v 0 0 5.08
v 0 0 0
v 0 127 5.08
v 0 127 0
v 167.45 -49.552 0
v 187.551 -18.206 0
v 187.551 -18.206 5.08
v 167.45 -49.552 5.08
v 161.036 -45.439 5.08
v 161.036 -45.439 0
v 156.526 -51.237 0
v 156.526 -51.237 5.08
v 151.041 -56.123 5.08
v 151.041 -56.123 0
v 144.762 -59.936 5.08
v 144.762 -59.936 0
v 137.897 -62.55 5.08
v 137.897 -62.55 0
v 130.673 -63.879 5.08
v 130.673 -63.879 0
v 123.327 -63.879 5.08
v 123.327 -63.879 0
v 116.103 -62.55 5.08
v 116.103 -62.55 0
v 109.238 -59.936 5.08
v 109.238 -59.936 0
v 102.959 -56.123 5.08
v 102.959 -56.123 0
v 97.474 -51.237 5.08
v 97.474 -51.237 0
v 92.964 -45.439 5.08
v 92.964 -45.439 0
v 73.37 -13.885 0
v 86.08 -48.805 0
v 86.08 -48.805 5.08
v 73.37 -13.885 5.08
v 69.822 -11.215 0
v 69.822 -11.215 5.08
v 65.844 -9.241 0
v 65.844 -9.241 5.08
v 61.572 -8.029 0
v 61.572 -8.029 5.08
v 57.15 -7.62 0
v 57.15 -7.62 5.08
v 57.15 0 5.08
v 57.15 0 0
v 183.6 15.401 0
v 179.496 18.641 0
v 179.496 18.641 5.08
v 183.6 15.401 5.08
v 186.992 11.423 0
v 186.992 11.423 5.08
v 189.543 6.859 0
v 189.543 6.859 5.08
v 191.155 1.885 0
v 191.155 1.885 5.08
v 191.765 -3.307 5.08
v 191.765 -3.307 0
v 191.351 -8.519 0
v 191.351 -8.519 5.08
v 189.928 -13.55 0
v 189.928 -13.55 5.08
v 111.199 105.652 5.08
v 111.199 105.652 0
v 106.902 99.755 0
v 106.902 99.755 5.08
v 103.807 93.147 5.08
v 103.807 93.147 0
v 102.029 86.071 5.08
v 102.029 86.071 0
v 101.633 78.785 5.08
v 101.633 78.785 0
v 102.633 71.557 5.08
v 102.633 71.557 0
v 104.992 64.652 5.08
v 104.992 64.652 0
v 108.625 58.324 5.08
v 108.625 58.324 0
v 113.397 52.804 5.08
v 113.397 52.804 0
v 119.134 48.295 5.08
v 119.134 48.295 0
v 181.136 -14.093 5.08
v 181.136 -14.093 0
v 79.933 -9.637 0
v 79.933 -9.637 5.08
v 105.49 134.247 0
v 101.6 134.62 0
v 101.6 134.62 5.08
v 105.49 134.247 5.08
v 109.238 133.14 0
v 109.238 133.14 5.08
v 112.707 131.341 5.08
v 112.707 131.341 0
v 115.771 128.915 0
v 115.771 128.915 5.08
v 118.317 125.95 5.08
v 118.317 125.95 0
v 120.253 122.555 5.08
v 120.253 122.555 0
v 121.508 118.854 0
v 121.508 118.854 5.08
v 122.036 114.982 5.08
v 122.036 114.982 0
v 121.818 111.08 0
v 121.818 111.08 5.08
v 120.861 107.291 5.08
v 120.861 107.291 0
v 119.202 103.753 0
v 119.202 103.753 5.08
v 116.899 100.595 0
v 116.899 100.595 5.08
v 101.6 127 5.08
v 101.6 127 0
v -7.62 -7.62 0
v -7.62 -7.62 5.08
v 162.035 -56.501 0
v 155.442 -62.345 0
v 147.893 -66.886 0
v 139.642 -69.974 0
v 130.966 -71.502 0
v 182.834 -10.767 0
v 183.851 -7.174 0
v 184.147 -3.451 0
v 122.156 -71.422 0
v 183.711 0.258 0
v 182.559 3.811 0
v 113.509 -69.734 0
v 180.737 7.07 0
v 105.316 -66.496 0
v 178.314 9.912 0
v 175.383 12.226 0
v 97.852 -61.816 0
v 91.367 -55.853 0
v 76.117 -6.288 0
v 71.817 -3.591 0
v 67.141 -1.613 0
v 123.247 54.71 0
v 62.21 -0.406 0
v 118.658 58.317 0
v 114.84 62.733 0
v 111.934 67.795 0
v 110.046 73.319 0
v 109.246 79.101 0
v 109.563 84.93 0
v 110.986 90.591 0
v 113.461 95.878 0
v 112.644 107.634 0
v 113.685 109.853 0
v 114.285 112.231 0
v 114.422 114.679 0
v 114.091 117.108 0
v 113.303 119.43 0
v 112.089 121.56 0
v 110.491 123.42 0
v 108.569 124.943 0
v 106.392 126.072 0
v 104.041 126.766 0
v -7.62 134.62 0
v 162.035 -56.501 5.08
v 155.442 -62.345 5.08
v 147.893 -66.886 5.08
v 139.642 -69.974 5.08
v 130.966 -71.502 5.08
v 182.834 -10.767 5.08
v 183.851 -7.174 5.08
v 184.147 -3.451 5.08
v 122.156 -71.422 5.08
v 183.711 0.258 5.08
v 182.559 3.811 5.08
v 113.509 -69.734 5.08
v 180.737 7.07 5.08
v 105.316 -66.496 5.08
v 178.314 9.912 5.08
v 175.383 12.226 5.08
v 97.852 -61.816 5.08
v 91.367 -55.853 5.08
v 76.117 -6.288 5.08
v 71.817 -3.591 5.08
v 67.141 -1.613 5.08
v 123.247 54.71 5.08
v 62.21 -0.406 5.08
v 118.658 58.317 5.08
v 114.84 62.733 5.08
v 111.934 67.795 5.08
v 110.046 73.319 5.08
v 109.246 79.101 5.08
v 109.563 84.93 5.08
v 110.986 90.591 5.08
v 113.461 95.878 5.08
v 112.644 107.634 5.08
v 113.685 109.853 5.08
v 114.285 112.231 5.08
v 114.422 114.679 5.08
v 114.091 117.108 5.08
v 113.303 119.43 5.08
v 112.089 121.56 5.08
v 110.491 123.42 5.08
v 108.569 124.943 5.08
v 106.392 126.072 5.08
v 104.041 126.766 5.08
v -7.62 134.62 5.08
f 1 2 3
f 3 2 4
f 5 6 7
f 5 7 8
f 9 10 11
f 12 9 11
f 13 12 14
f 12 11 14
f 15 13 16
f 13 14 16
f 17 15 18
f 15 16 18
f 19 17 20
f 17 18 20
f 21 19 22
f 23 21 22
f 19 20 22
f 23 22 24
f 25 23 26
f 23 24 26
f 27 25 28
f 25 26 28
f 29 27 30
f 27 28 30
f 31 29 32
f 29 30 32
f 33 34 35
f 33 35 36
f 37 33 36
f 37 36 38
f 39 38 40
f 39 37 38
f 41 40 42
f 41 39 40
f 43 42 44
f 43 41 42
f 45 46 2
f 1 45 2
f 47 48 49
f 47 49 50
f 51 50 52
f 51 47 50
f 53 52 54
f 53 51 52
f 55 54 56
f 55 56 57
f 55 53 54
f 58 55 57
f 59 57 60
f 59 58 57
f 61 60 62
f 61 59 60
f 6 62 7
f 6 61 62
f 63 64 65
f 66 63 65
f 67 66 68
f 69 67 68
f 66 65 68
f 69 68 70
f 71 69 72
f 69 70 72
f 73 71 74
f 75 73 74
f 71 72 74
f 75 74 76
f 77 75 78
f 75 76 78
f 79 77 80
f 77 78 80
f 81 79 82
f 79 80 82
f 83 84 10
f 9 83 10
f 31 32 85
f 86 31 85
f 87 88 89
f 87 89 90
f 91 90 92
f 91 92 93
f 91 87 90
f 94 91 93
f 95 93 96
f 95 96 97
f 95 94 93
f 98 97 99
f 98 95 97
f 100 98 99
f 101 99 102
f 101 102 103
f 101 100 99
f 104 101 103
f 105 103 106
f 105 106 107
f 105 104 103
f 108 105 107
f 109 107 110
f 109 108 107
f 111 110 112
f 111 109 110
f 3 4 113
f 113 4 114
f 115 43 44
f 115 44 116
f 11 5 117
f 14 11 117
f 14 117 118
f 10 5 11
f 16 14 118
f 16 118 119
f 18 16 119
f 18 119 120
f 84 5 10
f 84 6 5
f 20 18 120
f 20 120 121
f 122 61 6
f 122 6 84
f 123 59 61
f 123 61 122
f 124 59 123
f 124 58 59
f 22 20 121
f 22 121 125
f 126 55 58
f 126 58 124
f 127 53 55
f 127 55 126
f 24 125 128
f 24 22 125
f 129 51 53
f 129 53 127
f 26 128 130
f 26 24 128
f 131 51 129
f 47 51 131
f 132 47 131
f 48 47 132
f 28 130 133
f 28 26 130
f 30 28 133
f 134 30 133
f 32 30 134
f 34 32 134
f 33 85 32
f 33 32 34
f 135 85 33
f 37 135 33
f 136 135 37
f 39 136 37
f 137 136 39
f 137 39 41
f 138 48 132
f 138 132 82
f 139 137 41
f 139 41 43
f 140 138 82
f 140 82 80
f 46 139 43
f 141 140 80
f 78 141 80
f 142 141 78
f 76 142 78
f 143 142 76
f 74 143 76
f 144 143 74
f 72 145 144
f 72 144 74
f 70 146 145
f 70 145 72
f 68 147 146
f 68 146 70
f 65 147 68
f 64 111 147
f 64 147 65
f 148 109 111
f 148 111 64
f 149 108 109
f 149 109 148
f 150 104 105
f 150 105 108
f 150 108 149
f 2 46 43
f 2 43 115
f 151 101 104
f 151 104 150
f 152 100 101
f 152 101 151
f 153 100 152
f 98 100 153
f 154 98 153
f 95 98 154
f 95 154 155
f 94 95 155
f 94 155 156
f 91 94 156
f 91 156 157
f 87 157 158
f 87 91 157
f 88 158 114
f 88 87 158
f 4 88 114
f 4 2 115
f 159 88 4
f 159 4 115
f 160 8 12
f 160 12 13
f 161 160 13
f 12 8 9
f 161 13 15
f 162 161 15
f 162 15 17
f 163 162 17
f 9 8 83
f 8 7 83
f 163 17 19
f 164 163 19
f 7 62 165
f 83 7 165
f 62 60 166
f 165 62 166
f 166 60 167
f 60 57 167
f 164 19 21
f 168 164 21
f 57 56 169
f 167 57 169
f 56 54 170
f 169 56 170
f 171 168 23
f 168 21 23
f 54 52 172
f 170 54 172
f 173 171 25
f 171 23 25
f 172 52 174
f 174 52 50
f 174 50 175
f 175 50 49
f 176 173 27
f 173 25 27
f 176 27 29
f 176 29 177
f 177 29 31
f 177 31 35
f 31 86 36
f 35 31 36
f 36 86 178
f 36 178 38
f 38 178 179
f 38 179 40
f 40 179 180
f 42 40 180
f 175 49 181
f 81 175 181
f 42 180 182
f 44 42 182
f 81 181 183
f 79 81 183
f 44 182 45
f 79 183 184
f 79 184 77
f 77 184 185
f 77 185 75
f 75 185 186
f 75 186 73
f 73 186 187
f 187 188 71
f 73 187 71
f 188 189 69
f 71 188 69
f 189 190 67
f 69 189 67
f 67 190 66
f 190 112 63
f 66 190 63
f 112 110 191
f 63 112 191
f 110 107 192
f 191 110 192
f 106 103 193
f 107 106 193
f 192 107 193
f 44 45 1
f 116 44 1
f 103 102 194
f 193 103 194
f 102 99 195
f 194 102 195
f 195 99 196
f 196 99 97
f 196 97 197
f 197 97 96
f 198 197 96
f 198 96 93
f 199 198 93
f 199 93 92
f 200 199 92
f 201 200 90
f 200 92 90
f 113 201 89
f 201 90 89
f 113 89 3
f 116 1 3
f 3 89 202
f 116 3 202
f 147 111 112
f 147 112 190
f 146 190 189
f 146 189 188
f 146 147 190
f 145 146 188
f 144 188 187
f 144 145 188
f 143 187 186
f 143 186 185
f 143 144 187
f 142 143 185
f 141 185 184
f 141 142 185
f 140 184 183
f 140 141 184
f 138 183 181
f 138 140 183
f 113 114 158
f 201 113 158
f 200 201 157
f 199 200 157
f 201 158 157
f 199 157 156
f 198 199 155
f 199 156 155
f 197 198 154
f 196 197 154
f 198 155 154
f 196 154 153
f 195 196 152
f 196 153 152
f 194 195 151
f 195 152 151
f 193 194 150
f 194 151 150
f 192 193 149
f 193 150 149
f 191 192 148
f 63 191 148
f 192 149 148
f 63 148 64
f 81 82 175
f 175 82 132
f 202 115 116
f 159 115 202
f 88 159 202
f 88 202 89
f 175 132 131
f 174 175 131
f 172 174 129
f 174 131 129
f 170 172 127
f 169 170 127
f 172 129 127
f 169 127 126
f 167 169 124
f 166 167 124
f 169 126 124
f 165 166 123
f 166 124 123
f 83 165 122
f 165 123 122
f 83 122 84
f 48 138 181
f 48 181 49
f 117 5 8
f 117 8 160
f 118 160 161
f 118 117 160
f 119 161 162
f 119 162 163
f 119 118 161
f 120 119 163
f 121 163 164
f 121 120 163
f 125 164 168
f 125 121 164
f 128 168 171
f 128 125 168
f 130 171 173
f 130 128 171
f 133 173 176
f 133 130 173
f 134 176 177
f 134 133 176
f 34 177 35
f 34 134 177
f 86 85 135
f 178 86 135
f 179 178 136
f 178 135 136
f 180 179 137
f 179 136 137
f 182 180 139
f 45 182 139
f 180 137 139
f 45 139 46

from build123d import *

# Parameters (mm, degrees)
BOSS_EXTRUDE1_DEPTH = 5.08


with BuildPart() as part:
    # Sketch1 → Boss-Extrude1 (new body)
    with BuildSketch(Plane.XY):
        with BuildLine():
            Line((-7.62, -7.62), (-7.62, 134.62))
            Line((-7.62, 134.62), (101.6, 134.62))
            ThreePointArc((101.6, 134.62), (120.252989831, 122.555420822), (116.89921922, 100.595449896))
            ThreePointArc((116.89921922, 100.595449896), (109.507548694, 76.190999841), (123.247106812, 54.709879795))
            Line((123.247106812, 54.709879795), (179.49628154, 18.640745596))
            ThreePointArc((179.49628154, 18.640745596), (191.154782754, 1.885366153), (187.550745596, -18.20628154))
            Line((187.550745596, -18.20628154), (167.450498742, -49.552259826))
            ThreePointArc((167.450498742, -49.552259826), (126.559009674, -71.664336239), (86.0802479, -48.805472603))
            Line((86.0802479, -48.805472603), (73.370195116, -13.884889578))
            ThreePointArc((73.370195116, -13.884889578), (65.844014766, -9.240646228), (57.15, -7.62))
            Line((57.15, -7.62), (-7.62, -7.62))
        make_face()
        with BuildLine():
            Line((0, 0), (0, 127))
            Line((0, 127), (101.6, 127))
            ThreePointArc((101.6, 127), (113.303244129, 119.430451273), (111.199024024, 105.65234368))
            ThreePointArc((111.199024024, 105.65234368), (101.959435867, 75.14678111), (119.133883514, 48.295381054))
            Line((119.133883514, 48.295381054), (175.383058243, 12.226246854))
            ThreePointArc((175.383058243, 12.226246854), (183.71055911, 0.258118681), (181.136246854, -14.093058243))
            Line((181.136246854, -14.093058243), (161.036, -45.439036529))
            ThreePointArc((161.036, -45.439036529), (127, -64.046359823), (92.964, -45.439036529))
            Line((92.964, -45.439036529), (79.933032539, -9.636747677))
            ThreePointArc((79.933032539, -9.636747677), (69.518644605, -2.508263892), (57.15, 0))
            Line((57.15, 0), (0, 0))
        make_face(mode=Mode.SUBTRACT)
    extrude(amount=BOSS_EXTRUDE1_DEPTH)


solid = part.part
